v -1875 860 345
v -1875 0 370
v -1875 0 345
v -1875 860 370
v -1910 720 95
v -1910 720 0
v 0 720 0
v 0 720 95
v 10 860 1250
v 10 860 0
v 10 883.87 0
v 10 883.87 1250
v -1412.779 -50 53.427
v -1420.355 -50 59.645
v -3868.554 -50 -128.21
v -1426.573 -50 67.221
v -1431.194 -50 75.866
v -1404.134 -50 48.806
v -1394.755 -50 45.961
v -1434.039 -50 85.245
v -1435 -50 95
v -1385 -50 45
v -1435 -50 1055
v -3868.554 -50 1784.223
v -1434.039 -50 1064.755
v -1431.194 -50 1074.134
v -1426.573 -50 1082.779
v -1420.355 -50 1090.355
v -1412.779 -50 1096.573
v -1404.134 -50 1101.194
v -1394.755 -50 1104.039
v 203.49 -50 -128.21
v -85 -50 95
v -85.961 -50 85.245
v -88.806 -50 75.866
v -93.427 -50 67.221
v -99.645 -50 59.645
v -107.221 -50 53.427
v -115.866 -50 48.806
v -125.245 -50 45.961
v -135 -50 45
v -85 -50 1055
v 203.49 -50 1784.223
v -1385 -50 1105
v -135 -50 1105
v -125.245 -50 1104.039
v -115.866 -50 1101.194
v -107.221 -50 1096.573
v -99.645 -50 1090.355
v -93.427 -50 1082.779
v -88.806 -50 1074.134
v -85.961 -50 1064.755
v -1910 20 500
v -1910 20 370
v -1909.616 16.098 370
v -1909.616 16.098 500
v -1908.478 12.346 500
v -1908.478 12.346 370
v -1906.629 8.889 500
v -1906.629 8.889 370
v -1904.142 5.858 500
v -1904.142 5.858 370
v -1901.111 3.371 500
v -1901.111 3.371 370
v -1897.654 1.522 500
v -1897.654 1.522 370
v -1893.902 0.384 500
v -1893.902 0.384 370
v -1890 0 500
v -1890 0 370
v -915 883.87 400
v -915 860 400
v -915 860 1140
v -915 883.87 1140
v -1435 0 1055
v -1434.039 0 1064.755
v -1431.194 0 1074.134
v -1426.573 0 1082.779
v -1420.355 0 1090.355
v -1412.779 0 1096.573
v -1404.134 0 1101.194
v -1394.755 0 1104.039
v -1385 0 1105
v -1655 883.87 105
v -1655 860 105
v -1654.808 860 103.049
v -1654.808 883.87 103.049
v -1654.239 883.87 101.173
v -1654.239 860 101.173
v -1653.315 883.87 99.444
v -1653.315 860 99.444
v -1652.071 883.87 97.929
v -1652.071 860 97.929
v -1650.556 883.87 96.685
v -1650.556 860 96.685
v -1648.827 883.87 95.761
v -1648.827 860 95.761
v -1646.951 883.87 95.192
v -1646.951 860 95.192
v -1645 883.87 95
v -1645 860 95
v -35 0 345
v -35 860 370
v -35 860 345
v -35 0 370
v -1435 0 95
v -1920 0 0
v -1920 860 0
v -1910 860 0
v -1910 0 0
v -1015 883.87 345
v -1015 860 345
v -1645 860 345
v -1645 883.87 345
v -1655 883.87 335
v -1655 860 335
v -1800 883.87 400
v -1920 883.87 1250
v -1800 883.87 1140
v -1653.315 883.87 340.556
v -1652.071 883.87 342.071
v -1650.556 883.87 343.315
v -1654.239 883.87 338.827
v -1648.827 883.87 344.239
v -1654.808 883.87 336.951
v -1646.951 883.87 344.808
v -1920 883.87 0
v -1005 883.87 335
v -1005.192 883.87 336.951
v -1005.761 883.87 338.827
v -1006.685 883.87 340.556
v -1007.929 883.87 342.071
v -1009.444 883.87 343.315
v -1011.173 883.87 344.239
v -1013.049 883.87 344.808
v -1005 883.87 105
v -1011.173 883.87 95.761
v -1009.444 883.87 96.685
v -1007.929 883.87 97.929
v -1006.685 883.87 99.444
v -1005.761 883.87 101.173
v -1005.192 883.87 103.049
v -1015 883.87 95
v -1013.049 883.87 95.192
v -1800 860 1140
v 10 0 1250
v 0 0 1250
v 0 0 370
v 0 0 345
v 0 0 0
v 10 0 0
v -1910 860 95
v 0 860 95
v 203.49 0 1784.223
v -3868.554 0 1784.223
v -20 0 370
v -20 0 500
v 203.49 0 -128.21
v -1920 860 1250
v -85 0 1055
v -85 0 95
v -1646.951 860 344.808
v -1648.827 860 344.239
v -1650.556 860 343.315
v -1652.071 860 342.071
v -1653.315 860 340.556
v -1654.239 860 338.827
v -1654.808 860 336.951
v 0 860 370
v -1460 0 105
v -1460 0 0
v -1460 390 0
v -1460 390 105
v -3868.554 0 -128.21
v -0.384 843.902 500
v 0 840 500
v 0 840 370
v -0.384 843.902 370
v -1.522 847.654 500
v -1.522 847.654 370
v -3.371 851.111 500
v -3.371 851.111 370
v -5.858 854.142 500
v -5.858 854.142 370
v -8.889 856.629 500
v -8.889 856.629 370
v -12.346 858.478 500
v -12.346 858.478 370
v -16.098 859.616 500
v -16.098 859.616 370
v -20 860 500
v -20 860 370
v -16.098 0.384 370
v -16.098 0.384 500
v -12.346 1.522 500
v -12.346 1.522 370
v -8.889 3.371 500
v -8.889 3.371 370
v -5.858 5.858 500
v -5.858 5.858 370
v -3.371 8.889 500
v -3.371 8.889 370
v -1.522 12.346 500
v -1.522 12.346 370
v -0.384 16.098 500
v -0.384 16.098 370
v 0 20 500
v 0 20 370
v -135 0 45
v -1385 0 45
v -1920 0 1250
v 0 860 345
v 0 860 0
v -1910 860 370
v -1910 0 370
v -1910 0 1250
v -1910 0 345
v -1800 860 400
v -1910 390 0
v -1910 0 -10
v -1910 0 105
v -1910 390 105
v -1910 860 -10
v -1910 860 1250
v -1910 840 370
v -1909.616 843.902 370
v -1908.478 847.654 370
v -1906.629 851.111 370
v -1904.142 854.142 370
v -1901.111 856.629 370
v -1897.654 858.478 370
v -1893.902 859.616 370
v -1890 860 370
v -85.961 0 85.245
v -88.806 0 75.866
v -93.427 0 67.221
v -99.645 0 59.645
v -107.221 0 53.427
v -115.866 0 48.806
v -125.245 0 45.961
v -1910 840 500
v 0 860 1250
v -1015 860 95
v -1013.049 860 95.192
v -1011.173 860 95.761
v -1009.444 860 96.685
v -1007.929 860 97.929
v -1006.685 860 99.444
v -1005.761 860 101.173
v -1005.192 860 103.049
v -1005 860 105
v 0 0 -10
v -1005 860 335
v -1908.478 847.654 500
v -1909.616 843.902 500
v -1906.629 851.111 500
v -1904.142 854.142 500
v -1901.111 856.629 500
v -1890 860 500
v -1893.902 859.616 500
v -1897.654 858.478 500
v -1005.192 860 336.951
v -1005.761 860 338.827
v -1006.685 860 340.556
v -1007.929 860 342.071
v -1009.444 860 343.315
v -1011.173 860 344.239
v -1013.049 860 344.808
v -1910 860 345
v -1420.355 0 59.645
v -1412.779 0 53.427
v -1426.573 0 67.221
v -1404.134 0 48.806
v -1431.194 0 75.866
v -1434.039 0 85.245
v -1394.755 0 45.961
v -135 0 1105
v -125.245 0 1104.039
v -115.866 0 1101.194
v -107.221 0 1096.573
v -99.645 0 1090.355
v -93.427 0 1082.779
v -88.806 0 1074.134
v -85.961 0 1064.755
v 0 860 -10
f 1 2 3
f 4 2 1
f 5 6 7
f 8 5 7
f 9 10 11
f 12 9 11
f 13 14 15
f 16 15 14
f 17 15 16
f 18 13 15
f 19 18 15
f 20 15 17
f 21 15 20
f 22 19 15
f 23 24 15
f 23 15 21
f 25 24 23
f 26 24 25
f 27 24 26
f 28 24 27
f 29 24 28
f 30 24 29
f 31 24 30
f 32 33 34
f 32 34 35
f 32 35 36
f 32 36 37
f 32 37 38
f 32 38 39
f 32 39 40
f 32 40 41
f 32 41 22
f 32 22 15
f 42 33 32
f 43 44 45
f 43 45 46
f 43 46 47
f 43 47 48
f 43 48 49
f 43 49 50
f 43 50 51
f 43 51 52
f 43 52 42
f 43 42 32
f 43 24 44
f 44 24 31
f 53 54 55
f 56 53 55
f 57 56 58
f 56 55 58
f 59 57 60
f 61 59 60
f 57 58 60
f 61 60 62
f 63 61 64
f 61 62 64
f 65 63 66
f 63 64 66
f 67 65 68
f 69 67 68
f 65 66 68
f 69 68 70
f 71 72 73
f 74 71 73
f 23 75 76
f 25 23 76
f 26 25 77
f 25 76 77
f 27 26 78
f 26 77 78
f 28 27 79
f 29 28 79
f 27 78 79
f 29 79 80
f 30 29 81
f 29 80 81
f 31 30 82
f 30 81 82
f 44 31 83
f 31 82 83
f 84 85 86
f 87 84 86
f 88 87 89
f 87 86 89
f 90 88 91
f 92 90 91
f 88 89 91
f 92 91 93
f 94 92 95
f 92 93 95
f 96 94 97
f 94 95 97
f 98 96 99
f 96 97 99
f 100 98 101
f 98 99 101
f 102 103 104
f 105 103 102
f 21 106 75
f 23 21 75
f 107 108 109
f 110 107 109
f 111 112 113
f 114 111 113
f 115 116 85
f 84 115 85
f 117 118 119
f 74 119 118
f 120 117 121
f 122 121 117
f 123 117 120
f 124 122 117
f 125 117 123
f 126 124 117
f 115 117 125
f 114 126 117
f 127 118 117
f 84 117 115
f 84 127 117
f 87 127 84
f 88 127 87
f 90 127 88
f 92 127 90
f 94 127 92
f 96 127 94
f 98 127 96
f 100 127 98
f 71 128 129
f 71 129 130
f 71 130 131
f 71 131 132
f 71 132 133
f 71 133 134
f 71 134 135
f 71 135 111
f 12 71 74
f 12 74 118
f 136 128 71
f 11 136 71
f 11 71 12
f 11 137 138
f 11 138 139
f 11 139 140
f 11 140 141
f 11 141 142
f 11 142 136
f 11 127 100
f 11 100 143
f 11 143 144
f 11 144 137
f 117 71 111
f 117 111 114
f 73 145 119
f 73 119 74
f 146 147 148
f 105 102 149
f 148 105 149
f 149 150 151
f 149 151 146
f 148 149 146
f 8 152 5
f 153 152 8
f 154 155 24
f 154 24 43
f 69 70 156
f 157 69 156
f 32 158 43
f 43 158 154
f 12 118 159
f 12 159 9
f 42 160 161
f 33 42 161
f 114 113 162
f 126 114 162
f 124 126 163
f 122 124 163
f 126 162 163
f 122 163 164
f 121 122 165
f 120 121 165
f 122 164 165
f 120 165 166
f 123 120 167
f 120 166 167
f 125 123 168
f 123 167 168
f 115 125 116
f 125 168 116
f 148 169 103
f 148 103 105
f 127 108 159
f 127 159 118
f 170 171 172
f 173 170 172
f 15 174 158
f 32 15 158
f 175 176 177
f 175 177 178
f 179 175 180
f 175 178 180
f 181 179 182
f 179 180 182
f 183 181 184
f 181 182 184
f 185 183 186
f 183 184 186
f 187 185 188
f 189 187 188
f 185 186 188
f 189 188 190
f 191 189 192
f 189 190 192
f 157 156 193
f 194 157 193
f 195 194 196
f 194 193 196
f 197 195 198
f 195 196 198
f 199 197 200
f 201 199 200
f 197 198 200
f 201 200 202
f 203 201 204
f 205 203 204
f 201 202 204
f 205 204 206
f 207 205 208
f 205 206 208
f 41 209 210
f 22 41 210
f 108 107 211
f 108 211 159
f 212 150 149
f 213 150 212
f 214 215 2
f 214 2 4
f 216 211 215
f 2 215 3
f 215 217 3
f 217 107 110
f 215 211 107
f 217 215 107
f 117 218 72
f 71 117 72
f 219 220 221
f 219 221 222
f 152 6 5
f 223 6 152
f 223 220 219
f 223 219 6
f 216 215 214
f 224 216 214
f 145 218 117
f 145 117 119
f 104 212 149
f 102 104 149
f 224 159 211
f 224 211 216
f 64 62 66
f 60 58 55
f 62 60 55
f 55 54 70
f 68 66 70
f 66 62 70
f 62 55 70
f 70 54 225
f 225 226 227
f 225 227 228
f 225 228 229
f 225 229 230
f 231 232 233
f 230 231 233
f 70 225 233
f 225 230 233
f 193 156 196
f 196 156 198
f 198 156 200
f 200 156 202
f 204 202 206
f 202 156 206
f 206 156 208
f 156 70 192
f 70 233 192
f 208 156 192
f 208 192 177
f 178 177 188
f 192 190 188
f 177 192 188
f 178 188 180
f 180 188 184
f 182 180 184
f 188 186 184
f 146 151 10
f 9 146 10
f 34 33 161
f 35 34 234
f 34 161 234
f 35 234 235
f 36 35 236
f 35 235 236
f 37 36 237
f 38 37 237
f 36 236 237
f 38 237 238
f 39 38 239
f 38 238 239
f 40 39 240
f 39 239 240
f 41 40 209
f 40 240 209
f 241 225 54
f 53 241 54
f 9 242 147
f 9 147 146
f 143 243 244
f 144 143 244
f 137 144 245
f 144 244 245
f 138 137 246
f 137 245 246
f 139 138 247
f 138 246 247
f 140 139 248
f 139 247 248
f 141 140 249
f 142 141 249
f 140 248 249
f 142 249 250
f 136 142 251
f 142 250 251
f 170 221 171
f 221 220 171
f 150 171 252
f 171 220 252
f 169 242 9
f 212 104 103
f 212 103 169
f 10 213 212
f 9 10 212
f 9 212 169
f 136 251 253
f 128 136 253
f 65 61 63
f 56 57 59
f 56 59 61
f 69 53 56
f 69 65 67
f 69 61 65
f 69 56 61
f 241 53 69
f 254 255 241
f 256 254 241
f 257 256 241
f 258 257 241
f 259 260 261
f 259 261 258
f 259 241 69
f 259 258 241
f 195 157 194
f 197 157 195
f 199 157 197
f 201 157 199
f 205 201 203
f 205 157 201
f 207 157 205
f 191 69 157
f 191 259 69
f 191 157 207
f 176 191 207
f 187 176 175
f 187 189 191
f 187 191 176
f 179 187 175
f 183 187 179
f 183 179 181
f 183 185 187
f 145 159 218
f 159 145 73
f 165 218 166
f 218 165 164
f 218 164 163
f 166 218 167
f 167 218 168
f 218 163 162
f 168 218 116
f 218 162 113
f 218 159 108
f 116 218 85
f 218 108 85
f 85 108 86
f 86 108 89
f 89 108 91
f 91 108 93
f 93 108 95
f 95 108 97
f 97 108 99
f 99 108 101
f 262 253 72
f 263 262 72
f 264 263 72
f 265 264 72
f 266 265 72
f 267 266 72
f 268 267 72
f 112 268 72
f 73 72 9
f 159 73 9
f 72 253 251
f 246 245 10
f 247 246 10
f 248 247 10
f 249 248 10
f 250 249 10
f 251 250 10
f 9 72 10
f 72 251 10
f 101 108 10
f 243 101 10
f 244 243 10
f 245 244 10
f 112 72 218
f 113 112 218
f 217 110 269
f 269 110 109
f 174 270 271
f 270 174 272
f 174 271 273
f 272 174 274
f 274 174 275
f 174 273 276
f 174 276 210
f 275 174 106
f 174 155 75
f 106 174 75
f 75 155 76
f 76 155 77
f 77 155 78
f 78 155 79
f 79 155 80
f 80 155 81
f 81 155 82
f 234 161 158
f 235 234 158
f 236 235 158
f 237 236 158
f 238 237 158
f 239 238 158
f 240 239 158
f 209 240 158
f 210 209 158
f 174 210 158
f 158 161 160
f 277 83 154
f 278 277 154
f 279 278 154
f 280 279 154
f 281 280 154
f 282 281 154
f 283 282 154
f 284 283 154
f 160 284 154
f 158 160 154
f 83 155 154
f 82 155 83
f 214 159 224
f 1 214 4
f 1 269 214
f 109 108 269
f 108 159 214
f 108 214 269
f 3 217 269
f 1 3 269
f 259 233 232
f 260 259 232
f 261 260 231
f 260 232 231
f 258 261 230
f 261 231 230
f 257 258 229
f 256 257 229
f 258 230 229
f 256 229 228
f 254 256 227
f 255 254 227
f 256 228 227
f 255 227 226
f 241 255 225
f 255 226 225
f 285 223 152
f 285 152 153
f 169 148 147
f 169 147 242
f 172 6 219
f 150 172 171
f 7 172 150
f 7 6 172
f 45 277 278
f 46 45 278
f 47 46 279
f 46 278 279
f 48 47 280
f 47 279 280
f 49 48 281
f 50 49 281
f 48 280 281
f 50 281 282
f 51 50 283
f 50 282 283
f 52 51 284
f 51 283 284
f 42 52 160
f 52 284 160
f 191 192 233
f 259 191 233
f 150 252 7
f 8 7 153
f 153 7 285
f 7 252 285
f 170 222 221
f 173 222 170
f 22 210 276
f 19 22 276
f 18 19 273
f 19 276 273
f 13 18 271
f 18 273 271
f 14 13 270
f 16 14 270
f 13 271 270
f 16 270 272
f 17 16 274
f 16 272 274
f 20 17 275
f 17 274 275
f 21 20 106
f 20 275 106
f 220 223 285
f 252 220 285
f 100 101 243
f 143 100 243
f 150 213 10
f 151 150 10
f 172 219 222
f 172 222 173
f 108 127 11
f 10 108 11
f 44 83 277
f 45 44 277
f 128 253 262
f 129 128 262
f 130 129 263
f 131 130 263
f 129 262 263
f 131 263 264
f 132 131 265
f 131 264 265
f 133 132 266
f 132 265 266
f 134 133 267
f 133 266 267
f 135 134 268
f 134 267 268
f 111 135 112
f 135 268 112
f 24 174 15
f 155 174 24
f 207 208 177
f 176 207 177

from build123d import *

# Parameters (mm, degrees)
F0_W      = 1910
F0_H      = 860
F1_DEPTH  = 10
F2_W      = 450
F2_H      = 390
F3_DEPTH  = 105
F2_W_2    = 1910
F2_H_2    = 140
F4_DEPTH  = 95
F0_W_2    = 10
F5_DEPTH  = 1250
F6_DEPTH  = 1250
F7_W      = 860
F7_H      = 25
F8_DEPTH  = 35
F9_W      = 860
F9_H      = 25
F10_DEPTH = 35
F11_W     = 1930
F11_H     = 23.869872
F12_DEPTH = 1250
F14_DEPTH = 219
F13_W     = 885
F13_H     = 740
F15_DEPTH = 210
F17_DEPTH = 130
F18_W     = 4072.043269
F18_H     = 1912.433385
F19_DEPTH = 50
F21_DEPTH = 620


with BuildPart() as f1:
    # F0 (on Top) → F1 (new body)
    with BuildSketch(Plane.XY):
        with Locations((-955, 430)):
            Rectangle(F0_W, F0_H)
    extrude(amount=-F1_DEPTH)

    # F2 (on face) → F3 (join)
    with BuildSketch(Plane.XY):
        with Locations((-1685, 195)):
            Rectangle(F2_W, F2_H)
    extrude(amount=F3_DEPTH)

    # F2 (on face) → F4 (join)
    with BuildSketch(Plane.XY):
        with Locations((-955, 790)):
            Rectangle(F2_W_2, F2_H_2)
    extrude(amount=F4_DEPTH)


with BuildPart() as f5:
    # F0 (on Top) → F5 (new body)
    with BuildSketch(Plane.XY):
        with Locations((5, 430)):
            Rectangle(F0_W_2, F0_H)
    extrude(amount=F5_DEPTH)

    # F7 (on face) → F8 (join)
    with BuildSketch(Plane(origin=(0, 0, 0), x_dir=(0, -1, 0), z_dir=(-1, 0, 0))):
        with Locations((-430, 357.5)):
            Rectangle(F7_W, F7_H)
    extrude(amount=F8_DEPTH)


with BuildPart() as f6:
    # F0 (on Top) → F6 (new body)
    with BuildSketch(Plane.XY):
        with Locations((-1915, 430)):
            Rectangle(F0_W_2, F0_H)
    extrude(amount=F6_DEPTH)

    # F9 (on face) → F10 (join)
    with BuildSketch(Plane.YZ.offset(-1910)):
        with Locations((430, 357.5)):
            Rectangle(F9_W, F9_H)
    extrude(amount=F10_DEPTH)


with BuildPart() as f12:
    # F11 (on Top) → F12 (new body)
    with BuildSketch(Plane.XY):
        with Locations((-955, 871.934936)):
            Rectangle(F11_W, F11_H)
    extrude(amount=F12_DEPTH)

    # F13 (on face) → F14 (cut)
    with BuildSketch(Plane.XZ.offset(-860)):
        with BuildLine():
            Line((-1015, 345), (-1645, 345))
            ThreePointArc((-1645, 345), (-1652.071068, 342.071068), (-1655, 335))
            Line((-1655, 335), (-1655, 105))
            ThreePointArc((-1655, 105), (-1652.071068, 97.928932), (-1645, 95))
            Line((-1645, 95), (-1015, 95))
            ThreePointArc((-1015, 95), (-1007.928932, 97.928932), (-1005, 105))
            Line((-1005, 105), (-1005, 335))
            ThreePointArc((-1005, 335), (-1007.928932, 342.071068), (-1015, 345))
        make_face()
    extrude(amount=-F14_DEPTH, mode=Mode.SUBTRACT)

    # F13 (on face) → F15 (cut)
    with BuildSketch(Plane.XZ.offset(-860)):
        with Locations((-1357.5, 770)):
            Rectangle(F13_W, F13_H)
    extrude(amount=-F15_DEPTH, mode=Mode.SUBTRACT)


with BuildPart() as f17:
    # F16 (on face) → F17 (new body)
    with BuildSketch(Plane.XY.offset(370)):
        with BuildLine():
            Line((-20, 860), (-1890, 860))
            ThreePointArc((-1890, 860), (-1904.142136, 854.142136), (-1910, 840))
            Line((-1910, 840), (-1910, 20))
            ThreePointArc((-1910, 20), (-1904.142136, 5.857864), (-1890, 0))
            Line((-1890, 0), (-20, 0))
            ThreePointArc((-20, 0), (-5.857864, 5.857864), (0, 20))
            Line((0, 20), (0, 840))
            ThreePointArc((0, 840), (-5.857864, 854.142136), (-20, 860))
        make_face()
    extrude(amount=F17_DEPTH)


with BuildPart() as f19:
    # F18 (on Front) → F19 (new body)
    with BuildSketch(Plane.XZ):
        with Locations((-1832.532003, 828.006267)):
            Rectangle(F18_W, F18_H)
    extrude(amount=F19_DEPTH)

    # F20 (on face) → F21 (cut)
    with BuildSketch(Plane(origin=(0, 0, 0), x_dir=(-1, 0, 0), z_dir=(0, 1, 0))):
        with BuildLine():
            Line((1385, 1105), (135, 1105))
            ThreePointArc((135, 1105), (99.644661, 1090.355339), (85, 1055))
            Line((85, 1055), (85, 95))
            ThreePointArc((85, 95), (99.644661, 59.644661), (135, 45))
            Line((135, 45), (1385, 45))
            ThreePointArc((1385, 45), (1420.355339, 59.644661), (1435, 95))
            Line((1435, 95), (1435, 1055))
            ThreePointArc((1435, 1055), (1420.355339, 1090.355339), (1385, 1105))
        make_face()
    extrude(amount=-F21_DEPTH, mode=Mode.SUBTRACT)


solid = Compound([f1.part, f5.part, f6.part, f12.part, f17.part, f19.part])
